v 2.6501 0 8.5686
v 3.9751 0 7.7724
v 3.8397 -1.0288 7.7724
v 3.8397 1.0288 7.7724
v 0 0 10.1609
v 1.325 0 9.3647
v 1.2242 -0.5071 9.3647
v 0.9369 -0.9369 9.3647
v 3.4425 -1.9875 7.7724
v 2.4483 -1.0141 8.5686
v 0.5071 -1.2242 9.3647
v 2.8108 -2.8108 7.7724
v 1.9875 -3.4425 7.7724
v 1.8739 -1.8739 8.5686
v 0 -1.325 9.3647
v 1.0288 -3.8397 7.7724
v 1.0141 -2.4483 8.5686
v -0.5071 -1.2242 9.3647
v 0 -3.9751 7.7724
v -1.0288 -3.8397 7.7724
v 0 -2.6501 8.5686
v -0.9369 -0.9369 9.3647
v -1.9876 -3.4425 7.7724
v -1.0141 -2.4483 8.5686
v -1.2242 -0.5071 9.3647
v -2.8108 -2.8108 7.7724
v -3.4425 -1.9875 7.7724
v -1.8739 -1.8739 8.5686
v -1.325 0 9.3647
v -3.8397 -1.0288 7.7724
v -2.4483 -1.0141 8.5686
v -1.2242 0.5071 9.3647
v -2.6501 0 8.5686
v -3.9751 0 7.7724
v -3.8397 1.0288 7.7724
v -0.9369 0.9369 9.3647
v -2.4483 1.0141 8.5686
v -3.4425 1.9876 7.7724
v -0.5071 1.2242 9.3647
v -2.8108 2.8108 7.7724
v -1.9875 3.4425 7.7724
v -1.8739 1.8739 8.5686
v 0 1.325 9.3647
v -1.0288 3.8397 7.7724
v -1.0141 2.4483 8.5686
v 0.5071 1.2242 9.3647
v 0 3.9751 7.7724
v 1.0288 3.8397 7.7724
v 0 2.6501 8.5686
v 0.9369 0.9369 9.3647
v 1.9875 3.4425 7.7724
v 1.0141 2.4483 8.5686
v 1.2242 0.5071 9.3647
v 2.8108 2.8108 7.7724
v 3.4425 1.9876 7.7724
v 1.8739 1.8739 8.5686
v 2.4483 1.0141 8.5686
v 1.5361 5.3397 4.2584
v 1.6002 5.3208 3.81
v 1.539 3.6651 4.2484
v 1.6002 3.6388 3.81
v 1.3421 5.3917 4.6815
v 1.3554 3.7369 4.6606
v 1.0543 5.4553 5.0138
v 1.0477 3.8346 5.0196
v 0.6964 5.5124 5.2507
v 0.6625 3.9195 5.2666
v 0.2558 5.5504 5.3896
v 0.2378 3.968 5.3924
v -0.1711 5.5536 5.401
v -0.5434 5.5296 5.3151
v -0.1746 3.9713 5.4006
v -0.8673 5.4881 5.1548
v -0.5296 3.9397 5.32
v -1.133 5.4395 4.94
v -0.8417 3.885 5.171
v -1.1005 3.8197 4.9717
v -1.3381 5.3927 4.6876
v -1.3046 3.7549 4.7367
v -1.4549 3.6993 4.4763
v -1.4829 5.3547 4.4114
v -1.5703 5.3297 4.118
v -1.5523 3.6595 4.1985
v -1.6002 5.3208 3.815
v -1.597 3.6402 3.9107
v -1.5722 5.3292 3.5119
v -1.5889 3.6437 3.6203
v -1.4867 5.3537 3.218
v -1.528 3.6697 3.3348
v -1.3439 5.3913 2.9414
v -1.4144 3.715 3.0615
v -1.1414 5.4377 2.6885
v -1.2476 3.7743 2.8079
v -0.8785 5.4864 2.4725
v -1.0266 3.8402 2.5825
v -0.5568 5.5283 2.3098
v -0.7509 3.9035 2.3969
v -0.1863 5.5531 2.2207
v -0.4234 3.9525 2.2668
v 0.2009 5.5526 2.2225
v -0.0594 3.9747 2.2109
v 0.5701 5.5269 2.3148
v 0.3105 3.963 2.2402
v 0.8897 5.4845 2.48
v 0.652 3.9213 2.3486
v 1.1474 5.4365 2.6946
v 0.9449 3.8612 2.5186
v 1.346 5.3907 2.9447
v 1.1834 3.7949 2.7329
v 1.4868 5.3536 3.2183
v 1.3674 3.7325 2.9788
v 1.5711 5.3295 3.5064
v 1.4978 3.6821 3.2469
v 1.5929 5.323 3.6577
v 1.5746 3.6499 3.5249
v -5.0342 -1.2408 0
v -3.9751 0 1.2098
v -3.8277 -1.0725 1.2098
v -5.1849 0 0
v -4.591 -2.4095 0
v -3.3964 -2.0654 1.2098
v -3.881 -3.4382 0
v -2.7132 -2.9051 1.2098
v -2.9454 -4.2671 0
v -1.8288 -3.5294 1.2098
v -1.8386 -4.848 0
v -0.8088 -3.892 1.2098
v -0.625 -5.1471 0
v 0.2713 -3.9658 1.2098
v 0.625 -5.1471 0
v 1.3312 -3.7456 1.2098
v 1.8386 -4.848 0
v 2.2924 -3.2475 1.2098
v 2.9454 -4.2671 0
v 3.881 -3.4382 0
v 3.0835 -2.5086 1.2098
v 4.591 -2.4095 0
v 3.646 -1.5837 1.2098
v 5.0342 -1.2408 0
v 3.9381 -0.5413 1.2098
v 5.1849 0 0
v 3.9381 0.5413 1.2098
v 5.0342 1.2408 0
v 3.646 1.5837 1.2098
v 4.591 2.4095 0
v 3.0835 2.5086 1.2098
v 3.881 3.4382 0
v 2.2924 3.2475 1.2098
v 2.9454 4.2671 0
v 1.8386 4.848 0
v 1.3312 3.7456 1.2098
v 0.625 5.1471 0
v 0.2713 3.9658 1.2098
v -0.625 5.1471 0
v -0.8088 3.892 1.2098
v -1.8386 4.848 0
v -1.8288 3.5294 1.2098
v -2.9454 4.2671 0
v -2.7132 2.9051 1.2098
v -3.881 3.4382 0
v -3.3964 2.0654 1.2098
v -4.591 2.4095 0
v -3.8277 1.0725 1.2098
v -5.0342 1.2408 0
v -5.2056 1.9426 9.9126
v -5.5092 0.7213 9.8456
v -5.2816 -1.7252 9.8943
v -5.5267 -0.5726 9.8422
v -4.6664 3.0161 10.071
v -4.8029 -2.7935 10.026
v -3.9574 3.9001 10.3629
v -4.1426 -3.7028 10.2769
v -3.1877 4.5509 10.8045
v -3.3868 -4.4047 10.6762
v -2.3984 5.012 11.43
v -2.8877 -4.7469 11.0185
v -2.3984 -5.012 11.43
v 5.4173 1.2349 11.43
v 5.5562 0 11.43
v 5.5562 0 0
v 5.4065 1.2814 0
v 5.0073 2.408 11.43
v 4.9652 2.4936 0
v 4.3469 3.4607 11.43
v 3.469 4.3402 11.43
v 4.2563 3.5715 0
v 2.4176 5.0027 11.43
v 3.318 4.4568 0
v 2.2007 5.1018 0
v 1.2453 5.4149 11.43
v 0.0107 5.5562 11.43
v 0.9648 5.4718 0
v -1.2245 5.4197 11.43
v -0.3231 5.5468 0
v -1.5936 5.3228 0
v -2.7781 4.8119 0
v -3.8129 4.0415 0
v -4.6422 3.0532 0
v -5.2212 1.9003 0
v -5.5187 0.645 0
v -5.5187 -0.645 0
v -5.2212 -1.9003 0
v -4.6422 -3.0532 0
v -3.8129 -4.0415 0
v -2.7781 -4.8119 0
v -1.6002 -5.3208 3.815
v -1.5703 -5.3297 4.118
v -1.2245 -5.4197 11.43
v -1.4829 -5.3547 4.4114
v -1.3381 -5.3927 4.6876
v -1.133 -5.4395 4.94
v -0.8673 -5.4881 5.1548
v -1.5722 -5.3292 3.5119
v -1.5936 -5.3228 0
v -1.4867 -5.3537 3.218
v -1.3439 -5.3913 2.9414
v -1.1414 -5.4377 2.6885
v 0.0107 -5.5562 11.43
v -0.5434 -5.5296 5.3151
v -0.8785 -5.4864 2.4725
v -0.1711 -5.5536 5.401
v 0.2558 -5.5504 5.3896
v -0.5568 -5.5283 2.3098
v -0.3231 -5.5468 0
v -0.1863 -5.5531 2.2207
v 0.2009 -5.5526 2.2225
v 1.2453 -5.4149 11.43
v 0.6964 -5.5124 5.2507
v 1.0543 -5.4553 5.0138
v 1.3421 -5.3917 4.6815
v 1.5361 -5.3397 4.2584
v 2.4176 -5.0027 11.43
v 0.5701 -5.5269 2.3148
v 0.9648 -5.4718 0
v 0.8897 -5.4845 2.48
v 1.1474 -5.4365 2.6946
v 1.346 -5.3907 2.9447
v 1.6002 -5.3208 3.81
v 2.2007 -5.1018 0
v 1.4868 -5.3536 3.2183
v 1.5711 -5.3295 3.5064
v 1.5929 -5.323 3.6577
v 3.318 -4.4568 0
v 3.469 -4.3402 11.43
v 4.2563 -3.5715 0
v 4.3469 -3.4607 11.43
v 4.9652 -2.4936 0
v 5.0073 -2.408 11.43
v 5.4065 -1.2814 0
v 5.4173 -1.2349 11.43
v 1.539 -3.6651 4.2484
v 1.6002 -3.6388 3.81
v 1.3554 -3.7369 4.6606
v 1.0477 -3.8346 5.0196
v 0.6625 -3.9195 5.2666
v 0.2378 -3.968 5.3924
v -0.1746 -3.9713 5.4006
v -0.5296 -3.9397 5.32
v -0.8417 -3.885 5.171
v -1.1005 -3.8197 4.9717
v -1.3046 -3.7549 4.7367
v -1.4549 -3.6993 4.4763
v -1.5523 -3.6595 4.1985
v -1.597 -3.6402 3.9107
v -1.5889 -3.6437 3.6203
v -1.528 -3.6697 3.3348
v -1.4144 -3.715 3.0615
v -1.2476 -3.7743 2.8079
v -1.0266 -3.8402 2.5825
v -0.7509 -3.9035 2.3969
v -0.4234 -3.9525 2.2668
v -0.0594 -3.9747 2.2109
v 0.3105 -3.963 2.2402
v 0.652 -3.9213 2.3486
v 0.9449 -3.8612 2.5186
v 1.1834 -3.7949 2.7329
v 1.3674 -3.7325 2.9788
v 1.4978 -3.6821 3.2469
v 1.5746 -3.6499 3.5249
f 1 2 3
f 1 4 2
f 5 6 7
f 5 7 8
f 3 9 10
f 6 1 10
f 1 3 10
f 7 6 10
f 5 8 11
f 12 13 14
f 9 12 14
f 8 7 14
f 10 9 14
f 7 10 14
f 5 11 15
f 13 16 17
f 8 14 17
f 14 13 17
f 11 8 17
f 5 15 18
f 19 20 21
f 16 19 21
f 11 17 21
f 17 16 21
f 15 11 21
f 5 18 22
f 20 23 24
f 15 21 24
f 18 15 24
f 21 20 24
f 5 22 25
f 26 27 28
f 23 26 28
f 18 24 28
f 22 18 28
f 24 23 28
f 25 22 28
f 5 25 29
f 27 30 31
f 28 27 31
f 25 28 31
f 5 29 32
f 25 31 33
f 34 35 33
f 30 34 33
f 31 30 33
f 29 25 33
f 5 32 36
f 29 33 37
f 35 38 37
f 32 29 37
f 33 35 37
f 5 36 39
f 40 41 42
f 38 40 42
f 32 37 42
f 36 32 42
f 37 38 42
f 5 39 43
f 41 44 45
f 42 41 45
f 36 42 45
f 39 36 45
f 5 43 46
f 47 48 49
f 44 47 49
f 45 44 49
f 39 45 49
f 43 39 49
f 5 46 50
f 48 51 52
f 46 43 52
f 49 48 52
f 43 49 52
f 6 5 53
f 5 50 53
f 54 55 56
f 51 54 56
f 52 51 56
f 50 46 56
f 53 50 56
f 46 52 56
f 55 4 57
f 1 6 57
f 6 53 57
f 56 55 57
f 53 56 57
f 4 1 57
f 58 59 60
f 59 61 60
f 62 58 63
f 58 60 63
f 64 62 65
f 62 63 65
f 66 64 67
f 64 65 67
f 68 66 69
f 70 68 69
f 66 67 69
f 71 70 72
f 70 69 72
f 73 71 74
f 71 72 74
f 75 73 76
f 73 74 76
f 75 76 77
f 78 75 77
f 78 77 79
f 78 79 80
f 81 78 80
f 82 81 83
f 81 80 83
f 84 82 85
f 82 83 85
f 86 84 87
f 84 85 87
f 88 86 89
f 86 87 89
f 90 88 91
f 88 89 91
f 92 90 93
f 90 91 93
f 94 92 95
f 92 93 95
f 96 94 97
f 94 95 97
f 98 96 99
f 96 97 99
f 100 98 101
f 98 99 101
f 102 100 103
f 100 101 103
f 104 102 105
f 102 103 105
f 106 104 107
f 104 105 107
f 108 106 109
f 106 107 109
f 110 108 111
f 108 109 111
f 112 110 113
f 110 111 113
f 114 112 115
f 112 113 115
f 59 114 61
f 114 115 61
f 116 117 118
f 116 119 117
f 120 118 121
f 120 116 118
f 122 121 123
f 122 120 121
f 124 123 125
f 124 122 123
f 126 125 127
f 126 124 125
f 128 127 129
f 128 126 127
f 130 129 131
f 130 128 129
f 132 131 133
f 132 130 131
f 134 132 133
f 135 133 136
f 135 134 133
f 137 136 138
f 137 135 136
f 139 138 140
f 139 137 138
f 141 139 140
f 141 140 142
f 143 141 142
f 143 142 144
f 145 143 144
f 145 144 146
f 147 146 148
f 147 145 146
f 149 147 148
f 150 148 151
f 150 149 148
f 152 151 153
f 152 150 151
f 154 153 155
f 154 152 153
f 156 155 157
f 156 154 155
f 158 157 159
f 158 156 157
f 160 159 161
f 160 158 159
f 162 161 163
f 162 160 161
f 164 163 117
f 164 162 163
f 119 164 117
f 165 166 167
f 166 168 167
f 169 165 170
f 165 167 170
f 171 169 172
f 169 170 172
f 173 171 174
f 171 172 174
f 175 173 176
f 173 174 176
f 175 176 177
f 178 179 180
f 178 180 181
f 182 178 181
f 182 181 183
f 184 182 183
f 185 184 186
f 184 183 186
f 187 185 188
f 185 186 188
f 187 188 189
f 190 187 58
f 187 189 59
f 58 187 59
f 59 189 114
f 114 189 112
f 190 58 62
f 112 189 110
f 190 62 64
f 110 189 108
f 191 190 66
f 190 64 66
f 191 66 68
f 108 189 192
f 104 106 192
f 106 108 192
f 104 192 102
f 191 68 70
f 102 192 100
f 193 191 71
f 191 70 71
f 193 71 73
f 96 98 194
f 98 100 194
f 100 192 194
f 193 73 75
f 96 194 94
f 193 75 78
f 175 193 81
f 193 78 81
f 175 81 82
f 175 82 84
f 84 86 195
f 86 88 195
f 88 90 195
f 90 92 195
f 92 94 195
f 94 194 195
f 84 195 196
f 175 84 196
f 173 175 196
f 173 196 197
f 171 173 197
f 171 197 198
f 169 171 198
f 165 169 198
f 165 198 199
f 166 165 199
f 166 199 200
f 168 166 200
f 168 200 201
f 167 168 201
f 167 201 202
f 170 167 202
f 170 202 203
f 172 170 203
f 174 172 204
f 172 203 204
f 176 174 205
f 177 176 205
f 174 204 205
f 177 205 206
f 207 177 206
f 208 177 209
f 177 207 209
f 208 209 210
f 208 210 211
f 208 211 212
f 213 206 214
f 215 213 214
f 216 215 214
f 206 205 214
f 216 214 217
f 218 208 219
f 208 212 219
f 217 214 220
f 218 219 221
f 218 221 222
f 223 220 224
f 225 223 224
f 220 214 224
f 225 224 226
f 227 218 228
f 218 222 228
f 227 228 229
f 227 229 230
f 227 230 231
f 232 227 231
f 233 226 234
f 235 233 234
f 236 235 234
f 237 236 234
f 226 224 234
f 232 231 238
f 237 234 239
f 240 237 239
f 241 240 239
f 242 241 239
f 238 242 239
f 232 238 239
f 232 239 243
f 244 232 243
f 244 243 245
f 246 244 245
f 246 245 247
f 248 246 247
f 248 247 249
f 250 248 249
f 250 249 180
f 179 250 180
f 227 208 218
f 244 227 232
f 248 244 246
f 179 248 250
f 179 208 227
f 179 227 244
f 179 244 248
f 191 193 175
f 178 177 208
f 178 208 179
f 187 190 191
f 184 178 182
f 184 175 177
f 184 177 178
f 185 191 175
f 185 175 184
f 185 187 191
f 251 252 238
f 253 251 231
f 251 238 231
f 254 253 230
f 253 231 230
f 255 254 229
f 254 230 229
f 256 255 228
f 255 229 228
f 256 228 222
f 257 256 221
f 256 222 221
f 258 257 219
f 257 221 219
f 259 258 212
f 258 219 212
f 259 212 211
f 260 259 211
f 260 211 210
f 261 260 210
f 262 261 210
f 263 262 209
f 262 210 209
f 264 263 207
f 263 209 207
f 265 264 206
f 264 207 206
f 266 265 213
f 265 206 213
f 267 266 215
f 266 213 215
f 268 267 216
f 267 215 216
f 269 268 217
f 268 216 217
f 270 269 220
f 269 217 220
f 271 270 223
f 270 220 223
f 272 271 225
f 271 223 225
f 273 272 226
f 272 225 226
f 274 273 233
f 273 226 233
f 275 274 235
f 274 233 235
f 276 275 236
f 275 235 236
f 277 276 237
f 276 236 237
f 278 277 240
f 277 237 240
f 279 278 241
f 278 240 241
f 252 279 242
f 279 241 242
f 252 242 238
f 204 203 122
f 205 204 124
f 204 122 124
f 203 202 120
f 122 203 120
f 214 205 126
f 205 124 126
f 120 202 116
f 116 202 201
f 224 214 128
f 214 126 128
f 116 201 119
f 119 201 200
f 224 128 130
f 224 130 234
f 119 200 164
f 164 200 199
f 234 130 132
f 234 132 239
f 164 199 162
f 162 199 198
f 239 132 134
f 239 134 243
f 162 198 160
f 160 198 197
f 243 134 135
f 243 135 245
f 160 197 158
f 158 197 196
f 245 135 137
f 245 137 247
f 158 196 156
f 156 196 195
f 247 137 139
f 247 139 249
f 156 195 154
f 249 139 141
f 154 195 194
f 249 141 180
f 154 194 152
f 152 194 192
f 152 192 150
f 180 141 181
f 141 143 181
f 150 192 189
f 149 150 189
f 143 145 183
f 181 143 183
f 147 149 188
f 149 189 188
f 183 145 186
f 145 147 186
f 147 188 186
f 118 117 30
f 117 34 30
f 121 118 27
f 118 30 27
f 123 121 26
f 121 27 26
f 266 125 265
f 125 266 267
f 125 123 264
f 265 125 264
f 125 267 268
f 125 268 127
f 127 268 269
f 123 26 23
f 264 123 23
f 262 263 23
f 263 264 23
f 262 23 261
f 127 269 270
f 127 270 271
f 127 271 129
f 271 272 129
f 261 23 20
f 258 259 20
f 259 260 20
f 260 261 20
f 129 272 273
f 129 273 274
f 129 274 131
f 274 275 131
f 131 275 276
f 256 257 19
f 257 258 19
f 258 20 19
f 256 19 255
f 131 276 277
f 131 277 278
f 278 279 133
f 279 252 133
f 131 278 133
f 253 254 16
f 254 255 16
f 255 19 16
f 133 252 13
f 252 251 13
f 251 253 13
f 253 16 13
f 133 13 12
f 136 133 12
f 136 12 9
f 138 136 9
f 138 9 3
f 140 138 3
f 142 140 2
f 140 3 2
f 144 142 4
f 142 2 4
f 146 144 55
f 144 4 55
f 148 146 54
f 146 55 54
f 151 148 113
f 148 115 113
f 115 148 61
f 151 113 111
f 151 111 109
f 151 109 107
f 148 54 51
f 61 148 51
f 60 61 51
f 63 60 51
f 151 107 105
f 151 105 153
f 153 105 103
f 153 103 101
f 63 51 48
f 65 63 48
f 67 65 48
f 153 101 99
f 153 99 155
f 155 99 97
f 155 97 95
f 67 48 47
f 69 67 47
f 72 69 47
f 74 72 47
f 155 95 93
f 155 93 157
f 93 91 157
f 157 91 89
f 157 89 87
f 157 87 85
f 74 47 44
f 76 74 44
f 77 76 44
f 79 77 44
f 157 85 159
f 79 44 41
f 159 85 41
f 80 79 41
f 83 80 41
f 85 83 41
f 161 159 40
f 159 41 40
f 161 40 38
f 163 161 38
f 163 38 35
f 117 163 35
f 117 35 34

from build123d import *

# Parameters (mm, degrees)
F0_R     = 5.55625
F1_DEPTH = 11.43
F3_D     = 7.9502
F3_DEPTH = 7.7724
F3_TIP   = 2.3884810467
F4_R     = 6.35
F5_DEPTH = 12.7
F6_R     = 1.6002
F7_DEPTH = 12.7


with BuildPart() as f1:
    # F0 (on Top) → F1 (new body)
    with BuildSketch(Plane.XY):
        Circle(F0_R)
    extrude(amount=F1_DEPTH)

    # F3
    with Locations(Plane(origin=(0, 0, 0), x_dir=(1, 0, 0), z_dir=(0, 0, -1))):
        with Locations((0, 0)):
            Hole(F3_D / 2, depth=F3_DEPTH)
            with Locations((0, 0, -(F3_DEPTH + F3_TIP / 2))):  # 118° drill point
                Cone(0, F3_D / 2, F3_TIP, mode=Mode.SUBTRACT)

    # F4 (on Front) → F5 (cut, symmetric)
    with BuildSketch(Plane.XZ):
        with Locations((-6.72465, 16.0782)):
            Circle(F4_R)
    extrude(amount=F5_DEPTH, both=True, mode=Mode.SUBTRACT)

    # F6 (on Front) → F7 (cut, symmetric)
    with BuildSketch(Plane.XZ):
        with Locations((0, 3.81)):
            Circle(F6_R)
    extrude(amount=F7_DEPTH, both=True, mode=Mode.SUBTRACT)

    # F8 (on Front) → F9 (revolve, cut)
    with BuildSketch(Plane.XZ):
        Polygon((-3.9751, 0), (-3.9751, 1.209802), (-5.184902, 0), align=None)
    revolve(axis=Axis((0, 0, 6.5590362065), (0, 0, 1)), mode=Mode.SUBTRACT)


solid = f1.part
